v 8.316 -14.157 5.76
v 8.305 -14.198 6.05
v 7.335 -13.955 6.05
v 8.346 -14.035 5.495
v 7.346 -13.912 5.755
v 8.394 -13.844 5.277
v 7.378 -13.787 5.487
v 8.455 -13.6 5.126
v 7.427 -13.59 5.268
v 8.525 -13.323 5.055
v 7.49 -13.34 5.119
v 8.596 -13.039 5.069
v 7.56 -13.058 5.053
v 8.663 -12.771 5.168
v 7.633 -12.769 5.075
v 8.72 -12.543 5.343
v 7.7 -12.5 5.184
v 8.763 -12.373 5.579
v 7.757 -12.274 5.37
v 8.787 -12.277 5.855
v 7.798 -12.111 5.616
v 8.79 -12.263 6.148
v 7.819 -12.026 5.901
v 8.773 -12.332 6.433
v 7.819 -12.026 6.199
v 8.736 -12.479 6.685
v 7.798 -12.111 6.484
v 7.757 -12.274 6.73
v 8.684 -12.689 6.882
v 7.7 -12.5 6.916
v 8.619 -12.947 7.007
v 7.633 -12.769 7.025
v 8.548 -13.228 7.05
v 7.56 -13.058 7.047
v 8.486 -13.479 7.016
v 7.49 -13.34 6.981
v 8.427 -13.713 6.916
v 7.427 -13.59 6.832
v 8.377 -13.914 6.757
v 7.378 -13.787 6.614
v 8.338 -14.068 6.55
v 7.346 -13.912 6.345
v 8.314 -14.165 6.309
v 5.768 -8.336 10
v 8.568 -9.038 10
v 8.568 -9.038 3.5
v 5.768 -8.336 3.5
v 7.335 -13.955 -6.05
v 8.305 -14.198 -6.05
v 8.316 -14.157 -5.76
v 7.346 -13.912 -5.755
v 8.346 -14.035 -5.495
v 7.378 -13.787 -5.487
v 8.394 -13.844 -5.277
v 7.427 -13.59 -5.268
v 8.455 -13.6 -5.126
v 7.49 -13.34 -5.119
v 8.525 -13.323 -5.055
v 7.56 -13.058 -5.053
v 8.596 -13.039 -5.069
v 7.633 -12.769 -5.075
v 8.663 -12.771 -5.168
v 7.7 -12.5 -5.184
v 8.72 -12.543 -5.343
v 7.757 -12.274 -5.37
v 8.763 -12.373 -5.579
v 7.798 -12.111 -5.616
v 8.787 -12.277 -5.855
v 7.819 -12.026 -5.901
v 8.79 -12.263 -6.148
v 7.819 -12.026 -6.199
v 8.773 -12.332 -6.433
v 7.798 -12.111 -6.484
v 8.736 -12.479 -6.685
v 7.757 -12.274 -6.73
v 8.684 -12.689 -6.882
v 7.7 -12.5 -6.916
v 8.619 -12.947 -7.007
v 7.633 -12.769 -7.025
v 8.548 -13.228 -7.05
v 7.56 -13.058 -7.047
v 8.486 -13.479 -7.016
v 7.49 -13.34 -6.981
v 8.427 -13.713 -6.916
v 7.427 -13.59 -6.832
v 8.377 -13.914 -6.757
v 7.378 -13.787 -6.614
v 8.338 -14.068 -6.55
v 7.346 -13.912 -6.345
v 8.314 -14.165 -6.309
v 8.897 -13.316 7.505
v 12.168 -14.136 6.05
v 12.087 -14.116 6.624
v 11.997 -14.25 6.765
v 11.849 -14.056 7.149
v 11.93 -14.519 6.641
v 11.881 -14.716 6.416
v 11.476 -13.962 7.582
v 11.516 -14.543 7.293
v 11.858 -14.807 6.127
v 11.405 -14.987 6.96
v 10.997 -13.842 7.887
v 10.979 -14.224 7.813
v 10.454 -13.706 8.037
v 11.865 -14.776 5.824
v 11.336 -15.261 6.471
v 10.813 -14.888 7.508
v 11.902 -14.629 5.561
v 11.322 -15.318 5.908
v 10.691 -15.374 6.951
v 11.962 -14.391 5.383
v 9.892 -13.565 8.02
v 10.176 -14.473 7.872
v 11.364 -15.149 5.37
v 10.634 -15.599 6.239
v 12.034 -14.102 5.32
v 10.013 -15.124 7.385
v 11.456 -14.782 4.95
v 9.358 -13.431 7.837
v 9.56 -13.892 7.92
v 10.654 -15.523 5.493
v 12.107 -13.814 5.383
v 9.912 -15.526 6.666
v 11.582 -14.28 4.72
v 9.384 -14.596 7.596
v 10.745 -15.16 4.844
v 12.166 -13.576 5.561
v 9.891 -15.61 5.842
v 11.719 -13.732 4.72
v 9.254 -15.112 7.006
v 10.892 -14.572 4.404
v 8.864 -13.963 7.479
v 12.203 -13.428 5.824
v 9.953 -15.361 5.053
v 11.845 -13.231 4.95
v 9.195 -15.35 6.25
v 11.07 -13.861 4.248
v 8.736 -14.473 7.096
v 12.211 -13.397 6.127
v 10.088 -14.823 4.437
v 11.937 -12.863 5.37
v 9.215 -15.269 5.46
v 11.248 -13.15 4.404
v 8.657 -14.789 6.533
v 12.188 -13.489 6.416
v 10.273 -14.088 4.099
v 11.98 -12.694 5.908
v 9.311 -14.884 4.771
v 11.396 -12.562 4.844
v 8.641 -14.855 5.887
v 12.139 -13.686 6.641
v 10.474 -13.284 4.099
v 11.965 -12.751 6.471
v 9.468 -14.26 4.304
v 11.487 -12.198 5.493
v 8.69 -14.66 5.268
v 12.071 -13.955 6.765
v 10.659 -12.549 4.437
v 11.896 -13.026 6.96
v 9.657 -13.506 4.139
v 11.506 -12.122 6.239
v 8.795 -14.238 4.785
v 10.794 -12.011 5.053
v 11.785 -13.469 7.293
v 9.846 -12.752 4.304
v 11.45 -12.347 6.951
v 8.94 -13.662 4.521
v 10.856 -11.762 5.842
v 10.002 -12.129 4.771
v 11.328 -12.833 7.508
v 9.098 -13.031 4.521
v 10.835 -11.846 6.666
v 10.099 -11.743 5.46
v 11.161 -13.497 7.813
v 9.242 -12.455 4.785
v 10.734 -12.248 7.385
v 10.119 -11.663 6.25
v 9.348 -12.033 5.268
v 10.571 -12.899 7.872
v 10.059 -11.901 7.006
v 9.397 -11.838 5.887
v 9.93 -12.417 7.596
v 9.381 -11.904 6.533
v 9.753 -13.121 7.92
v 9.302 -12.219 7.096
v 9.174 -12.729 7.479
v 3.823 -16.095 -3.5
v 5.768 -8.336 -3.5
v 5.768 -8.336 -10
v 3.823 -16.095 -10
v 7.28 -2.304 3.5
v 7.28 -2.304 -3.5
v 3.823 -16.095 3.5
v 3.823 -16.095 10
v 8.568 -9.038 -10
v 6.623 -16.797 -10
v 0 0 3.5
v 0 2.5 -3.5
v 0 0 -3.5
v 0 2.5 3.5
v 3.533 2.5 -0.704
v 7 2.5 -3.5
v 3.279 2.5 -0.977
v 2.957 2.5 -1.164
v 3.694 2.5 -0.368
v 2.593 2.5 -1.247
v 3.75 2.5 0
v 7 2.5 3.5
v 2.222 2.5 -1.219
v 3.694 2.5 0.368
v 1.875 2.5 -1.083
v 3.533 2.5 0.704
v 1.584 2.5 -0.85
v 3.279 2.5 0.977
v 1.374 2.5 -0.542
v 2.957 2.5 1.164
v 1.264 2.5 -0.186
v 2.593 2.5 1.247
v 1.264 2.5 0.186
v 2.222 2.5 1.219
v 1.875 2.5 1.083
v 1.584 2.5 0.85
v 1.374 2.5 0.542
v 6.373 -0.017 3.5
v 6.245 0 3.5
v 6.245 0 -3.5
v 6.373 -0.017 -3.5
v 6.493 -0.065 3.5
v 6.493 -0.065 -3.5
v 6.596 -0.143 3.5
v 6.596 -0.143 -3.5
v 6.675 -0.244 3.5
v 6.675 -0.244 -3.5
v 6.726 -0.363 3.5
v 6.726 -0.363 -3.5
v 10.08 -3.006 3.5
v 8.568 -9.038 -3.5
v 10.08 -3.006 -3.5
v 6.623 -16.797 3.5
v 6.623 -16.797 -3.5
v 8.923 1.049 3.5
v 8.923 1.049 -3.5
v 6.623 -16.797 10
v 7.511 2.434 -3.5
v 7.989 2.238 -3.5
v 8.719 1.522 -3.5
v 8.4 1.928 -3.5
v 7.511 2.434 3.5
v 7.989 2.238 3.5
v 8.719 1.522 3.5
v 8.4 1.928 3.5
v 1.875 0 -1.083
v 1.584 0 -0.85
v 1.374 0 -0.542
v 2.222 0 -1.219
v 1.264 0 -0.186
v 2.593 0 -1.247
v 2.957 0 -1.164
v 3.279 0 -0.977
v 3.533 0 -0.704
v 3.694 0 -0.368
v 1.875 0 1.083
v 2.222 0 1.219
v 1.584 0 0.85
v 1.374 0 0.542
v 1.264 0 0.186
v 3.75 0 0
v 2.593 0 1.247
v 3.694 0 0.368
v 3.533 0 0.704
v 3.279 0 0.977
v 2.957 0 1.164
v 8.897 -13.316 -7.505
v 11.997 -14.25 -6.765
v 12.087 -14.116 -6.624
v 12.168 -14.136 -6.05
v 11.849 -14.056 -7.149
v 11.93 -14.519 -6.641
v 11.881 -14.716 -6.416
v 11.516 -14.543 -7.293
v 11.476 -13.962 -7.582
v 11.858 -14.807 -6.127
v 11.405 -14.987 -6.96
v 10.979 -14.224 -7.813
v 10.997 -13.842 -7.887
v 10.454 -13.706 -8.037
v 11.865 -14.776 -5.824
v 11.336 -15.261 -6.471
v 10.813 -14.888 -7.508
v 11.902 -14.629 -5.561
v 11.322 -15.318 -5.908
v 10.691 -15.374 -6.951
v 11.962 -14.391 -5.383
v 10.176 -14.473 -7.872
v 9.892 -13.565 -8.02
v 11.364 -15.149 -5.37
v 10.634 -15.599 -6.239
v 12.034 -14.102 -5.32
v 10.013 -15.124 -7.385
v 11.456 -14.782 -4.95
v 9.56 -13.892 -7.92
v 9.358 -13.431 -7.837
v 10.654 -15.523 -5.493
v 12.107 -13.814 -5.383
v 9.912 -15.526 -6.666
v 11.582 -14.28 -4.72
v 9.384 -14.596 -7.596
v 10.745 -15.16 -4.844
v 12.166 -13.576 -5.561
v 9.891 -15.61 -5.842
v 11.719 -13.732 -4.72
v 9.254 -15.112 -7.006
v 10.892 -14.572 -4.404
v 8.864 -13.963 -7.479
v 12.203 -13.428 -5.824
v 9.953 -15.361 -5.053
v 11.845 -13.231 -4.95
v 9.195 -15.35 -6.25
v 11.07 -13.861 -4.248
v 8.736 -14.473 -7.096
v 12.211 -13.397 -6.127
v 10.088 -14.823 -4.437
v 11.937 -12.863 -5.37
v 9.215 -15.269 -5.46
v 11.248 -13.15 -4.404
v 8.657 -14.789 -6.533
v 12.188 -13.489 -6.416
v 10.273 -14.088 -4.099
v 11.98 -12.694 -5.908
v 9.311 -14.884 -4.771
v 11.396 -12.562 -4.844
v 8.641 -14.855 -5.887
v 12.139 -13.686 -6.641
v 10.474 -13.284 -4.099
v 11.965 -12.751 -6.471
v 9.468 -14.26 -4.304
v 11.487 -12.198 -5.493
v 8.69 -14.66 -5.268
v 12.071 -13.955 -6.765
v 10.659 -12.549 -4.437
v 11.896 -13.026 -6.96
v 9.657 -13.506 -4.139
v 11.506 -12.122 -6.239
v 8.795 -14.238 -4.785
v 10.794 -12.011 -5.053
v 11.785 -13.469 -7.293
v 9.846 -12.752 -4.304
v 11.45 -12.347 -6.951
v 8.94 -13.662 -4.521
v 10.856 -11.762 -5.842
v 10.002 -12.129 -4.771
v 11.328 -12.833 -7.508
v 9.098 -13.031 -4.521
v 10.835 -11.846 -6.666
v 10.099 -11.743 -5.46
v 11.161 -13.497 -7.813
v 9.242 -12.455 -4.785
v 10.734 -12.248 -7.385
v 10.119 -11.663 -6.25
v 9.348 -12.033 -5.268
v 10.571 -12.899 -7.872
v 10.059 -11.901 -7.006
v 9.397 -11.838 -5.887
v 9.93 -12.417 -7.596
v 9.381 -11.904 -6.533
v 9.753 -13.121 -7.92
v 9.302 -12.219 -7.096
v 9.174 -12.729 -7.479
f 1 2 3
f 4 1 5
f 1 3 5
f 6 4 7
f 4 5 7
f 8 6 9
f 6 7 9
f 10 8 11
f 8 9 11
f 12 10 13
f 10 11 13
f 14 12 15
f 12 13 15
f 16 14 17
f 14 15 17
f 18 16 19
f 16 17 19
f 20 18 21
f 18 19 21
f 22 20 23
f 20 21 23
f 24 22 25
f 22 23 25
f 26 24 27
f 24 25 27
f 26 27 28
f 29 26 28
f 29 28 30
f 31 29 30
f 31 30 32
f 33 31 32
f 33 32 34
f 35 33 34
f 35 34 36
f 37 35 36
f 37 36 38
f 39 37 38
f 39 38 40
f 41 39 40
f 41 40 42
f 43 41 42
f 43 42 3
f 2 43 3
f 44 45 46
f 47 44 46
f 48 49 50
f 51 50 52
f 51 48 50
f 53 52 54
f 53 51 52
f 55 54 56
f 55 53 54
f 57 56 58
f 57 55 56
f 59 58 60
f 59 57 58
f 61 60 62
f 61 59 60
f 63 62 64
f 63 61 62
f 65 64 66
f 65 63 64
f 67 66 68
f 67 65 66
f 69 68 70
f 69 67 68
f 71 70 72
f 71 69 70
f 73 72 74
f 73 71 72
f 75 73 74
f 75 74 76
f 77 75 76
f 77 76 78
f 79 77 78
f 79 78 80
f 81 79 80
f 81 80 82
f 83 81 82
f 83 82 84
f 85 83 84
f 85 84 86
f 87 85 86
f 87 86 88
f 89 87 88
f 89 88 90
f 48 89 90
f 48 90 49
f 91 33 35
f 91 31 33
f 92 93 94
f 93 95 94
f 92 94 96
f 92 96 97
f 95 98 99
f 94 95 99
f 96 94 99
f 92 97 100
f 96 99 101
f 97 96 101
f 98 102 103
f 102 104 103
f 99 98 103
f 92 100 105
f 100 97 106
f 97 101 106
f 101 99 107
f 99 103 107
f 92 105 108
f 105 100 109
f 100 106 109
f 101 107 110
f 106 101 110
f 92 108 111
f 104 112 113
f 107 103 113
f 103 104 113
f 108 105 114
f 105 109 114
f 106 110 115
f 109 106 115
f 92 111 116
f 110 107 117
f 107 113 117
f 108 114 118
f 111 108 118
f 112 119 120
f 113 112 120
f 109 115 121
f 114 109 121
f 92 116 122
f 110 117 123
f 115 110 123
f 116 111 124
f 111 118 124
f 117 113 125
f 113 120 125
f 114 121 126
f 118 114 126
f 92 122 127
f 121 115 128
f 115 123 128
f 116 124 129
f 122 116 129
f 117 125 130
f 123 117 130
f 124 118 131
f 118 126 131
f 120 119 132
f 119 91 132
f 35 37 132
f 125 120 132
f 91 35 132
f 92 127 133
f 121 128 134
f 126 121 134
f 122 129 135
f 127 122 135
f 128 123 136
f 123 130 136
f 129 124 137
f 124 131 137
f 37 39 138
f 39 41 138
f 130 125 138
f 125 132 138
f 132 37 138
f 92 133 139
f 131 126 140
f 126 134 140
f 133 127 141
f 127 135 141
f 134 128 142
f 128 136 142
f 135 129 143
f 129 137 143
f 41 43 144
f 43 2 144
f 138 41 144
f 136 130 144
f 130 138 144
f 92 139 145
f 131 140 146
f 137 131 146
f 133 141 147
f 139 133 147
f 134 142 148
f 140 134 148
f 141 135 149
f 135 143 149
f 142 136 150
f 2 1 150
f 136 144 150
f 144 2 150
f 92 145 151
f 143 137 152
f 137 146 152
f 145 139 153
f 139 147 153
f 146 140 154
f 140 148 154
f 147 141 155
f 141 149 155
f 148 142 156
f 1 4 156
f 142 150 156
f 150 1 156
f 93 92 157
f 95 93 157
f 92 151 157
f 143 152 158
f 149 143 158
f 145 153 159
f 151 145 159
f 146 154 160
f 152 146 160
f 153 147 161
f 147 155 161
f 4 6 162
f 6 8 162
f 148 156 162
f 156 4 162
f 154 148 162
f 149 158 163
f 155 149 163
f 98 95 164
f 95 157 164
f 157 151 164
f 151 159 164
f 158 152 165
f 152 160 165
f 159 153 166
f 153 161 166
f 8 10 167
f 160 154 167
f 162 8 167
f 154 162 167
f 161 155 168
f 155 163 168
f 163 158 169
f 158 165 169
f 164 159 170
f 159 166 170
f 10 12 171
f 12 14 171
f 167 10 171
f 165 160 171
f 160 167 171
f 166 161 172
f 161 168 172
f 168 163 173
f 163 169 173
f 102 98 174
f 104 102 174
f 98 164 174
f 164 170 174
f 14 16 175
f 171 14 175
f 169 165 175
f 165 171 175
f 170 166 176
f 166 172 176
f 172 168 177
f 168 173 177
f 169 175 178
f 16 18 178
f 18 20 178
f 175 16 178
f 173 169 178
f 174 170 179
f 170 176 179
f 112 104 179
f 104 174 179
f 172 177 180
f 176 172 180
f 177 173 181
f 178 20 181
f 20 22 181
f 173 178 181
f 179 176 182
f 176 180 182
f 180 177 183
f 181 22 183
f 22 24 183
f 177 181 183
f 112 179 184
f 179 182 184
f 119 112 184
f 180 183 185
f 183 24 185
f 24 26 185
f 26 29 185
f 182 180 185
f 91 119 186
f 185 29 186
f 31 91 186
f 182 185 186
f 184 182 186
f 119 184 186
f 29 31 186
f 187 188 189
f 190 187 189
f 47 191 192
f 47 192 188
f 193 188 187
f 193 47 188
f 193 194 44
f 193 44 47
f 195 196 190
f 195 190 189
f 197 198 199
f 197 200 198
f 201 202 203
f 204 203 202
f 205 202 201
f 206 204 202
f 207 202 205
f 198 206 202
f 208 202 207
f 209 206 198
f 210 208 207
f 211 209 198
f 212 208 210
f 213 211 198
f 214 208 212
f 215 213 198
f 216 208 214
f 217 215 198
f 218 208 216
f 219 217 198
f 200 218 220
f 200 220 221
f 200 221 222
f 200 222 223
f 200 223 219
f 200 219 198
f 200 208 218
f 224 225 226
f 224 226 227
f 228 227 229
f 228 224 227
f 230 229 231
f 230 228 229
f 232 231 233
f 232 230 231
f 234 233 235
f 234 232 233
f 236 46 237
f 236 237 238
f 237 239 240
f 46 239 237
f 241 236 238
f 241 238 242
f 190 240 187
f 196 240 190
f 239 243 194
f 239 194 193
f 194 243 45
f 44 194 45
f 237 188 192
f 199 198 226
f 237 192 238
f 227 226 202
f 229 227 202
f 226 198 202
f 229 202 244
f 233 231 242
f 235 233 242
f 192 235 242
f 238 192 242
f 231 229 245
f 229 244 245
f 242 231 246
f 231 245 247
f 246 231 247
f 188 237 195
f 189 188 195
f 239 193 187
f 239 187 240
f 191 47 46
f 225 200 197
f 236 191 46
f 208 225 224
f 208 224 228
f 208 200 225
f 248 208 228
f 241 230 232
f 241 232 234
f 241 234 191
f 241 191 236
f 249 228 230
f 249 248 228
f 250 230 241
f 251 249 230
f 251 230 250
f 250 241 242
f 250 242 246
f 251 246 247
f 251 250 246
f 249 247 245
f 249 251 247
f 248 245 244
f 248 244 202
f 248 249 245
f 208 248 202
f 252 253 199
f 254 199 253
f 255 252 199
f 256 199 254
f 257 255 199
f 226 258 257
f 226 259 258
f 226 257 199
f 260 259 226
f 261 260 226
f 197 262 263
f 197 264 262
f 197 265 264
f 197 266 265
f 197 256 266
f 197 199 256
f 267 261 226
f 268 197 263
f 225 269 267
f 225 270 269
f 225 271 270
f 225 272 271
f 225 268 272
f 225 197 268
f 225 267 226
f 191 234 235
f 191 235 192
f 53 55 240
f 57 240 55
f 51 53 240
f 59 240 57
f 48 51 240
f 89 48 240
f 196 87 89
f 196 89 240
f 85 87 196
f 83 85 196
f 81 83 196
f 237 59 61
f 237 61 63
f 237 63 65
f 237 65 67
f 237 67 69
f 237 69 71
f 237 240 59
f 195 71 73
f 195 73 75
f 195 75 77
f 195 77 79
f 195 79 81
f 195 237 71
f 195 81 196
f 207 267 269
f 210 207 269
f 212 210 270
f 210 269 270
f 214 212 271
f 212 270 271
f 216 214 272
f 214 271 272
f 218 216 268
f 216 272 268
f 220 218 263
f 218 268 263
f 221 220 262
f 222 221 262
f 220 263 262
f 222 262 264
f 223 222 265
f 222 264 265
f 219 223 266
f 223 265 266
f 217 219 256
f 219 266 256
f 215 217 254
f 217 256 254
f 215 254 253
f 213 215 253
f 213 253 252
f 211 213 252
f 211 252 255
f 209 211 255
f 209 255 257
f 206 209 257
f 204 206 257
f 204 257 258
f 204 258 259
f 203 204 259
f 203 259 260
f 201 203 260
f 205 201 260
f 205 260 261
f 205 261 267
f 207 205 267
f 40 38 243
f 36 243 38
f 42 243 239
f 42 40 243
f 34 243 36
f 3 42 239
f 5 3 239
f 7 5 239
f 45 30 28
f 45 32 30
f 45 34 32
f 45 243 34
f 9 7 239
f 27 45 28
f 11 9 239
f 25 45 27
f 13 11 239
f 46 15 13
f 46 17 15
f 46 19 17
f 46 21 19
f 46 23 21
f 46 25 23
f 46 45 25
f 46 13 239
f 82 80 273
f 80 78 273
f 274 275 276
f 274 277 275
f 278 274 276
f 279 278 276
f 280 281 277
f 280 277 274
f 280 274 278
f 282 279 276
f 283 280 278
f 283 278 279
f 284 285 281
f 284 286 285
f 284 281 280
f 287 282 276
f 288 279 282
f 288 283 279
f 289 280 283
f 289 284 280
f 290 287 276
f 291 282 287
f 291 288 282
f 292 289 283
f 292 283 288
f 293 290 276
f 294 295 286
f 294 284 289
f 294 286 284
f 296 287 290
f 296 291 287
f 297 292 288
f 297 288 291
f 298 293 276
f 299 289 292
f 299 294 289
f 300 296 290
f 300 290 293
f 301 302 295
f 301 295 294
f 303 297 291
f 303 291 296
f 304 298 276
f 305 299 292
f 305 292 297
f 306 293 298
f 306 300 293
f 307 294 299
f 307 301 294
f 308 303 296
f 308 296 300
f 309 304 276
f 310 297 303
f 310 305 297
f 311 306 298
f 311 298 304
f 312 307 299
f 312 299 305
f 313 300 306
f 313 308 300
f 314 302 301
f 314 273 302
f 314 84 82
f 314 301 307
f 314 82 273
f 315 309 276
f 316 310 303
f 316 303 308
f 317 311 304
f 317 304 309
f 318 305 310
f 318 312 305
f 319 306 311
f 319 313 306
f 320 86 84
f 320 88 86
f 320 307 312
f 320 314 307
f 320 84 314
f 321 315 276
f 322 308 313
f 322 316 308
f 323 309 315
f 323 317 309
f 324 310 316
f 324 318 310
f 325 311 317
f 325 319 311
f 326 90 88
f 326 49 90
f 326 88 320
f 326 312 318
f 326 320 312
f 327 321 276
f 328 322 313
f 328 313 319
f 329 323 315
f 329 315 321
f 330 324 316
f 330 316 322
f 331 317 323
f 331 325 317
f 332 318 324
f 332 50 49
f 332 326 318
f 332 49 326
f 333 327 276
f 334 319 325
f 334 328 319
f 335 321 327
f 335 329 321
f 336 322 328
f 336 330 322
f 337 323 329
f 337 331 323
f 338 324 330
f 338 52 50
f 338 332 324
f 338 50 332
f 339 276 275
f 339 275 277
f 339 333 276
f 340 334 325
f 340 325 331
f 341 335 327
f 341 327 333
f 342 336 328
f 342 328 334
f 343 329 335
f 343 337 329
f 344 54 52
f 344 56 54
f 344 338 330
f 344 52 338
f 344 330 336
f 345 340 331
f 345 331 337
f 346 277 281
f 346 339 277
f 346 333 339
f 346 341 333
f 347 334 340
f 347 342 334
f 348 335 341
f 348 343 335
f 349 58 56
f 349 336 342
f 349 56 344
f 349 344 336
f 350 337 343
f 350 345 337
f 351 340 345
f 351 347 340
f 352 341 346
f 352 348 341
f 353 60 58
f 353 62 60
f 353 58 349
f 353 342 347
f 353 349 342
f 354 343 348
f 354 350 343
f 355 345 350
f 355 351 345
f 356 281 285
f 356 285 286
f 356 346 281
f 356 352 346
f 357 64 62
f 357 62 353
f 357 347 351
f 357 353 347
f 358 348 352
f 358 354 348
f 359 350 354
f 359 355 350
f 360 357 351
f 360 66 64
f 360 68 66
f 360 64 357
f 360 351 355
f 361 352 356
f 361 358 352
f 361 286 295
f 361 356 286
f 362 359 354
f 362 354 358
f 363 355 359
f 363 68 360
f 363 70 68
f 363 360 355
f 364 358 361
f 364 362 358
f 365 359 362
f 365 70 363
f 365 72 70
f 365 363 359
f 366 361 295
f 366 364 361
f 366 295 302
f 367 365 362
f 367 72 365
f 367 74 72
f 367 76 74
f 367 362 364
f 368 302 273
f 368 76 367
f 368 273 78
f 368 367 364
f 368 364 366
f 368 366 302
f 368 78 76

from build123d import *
from build123d.topology import SkipClean

# Parameters (mm, degrees)
EXTRUDE_1_DEPTH     = 3.5
SKETCH_2_R          = 1.25
CUT_EXTRUDE_3_DEPTH = 5.5
SKETCH_3_W          = 20
SKETCH_3_H          = 8
EXTRUDE_2_DEPTH     = 2.886751
SKETCH_4_R          = 1
EXTRUDE_3_DEPTH     = 1


with BuildPart() as part:
    # 草图1 → 凸台-拉伸1 (new, symmetric)
    with BuildSketch(Plane.XY):
        with BuildLine():
            Line((0, 0), (6.245432753, 0))
            ThreePointArc((6.245432753, 0), (6.54659813, -0.100876691), (6.72624124, -0.362802336))
            Line((6.72624124, -0.362802336), (7.280170813, -2.304045596))
            Line((7.280170813, -2.304045596), (3.822659371, -16.095442623))
            Line((3.822659371, -16.095442623), (6.622757346, -16.797428852))
            Line((6.622757346, -16.797428852), (10.080268787, -3.006031824))
            Line((10.080268787, -3.006031824), (8.923233948, 1.048790655))
            ThreePointArc((8.923233948, 1.048790655), (8.204661507, 2.096493237), (7, 2.5))
            Line((7, 2.5), (0, 2.5))
            Line((0, 2.5), (0, 0))
        make_face()
    extrude(amount=EXTRUDE_1_DEPTH, both=True)

    # 草图2 → 切除-拉伸3 (cut)
    with BuildSketch(Plane.XZ):
        with Locations((2.5, 0)):
            Circle(SKETCH_2_R)
    extrude(amount=-CUT_EXTRUDE_3_DEPTH, mode=Mode.SUBTRACT)

    # 草图3 → 凸台-拉伸2 (add)
    with SkipClean():  # the faces are left unmerged after this step: merging them gives an invalid solid
        with BuildSketch(Plane(origin=(10.193230201, -2.555448877, 0), x_dir=(0, 0, -1), z_dir=(0.969982391695105, -0.24317516279719864, 0))):
            with Locations((0, -10.682720116)):
                Rectangle(SKETCH_3_W, SKETCH_3_H)
        extrude(amount=-EXTRUDE_2_DEPTH)

    # 草图4 → 凸台-拉伸3 (add)
    with SkipClean():  # the faces are left unmerged after this step: merging them gives an invalid solid
        with BuildSketch(Plane(origin=(10.193230201, -2.555448877, 0), x_dir=(0, 0, -1), z_dir=(0.969982391695105, -0.24317516279719864, 0))):
            with Locations(Location((-6.050193859, -10.752531826, 0), (0, 0, 270))):
                Circle(SKETCH_4_R)
        extrude_3 = extrude(amount=EXTRUDE_3_DEPTH)

    # 草图5 → 旋转1 (revolve)
    with SkipClean():  # the faces are left unmerged after this step: merging them gives an invalid solid
        with BuildSketch(Plane(origin=(-2.614748677, -10.429766537, 0), x_dir=(-0.969982391695105, 0.24317516279719864, 0), z_dir=(0.24317516279719864, 0.969982391695105, 0))):
            with BuildLine():
                Line((-11.508675506, 6.050193859), (-15.240726313, 6.050193859))
                ThreePointArc((-15.240726313, 6.050193859), (-13.758364403, 7.982045511), (-11.508675506, 7.050193859))
                Line((-11.508675506, 7.050193859), (-11.508675506, 6.050193859))
            make_face()
        revolve_1 = revolve(axis=Axis((8.548463915, -13.228390577, 6.050193859), (0.9699823916951049, -0.24317516279719897, 0)))

    # 镜向1: 凸台-拉伸3, 旋转1 across plane
    with SkipClean():  # the faces are left unmerged after this step: merging them gives an invalid solid
        add(extrude_3.mirror(Plane.XY))
        add(revolve_1.mirror(Plane.XY))


solid = part.part
